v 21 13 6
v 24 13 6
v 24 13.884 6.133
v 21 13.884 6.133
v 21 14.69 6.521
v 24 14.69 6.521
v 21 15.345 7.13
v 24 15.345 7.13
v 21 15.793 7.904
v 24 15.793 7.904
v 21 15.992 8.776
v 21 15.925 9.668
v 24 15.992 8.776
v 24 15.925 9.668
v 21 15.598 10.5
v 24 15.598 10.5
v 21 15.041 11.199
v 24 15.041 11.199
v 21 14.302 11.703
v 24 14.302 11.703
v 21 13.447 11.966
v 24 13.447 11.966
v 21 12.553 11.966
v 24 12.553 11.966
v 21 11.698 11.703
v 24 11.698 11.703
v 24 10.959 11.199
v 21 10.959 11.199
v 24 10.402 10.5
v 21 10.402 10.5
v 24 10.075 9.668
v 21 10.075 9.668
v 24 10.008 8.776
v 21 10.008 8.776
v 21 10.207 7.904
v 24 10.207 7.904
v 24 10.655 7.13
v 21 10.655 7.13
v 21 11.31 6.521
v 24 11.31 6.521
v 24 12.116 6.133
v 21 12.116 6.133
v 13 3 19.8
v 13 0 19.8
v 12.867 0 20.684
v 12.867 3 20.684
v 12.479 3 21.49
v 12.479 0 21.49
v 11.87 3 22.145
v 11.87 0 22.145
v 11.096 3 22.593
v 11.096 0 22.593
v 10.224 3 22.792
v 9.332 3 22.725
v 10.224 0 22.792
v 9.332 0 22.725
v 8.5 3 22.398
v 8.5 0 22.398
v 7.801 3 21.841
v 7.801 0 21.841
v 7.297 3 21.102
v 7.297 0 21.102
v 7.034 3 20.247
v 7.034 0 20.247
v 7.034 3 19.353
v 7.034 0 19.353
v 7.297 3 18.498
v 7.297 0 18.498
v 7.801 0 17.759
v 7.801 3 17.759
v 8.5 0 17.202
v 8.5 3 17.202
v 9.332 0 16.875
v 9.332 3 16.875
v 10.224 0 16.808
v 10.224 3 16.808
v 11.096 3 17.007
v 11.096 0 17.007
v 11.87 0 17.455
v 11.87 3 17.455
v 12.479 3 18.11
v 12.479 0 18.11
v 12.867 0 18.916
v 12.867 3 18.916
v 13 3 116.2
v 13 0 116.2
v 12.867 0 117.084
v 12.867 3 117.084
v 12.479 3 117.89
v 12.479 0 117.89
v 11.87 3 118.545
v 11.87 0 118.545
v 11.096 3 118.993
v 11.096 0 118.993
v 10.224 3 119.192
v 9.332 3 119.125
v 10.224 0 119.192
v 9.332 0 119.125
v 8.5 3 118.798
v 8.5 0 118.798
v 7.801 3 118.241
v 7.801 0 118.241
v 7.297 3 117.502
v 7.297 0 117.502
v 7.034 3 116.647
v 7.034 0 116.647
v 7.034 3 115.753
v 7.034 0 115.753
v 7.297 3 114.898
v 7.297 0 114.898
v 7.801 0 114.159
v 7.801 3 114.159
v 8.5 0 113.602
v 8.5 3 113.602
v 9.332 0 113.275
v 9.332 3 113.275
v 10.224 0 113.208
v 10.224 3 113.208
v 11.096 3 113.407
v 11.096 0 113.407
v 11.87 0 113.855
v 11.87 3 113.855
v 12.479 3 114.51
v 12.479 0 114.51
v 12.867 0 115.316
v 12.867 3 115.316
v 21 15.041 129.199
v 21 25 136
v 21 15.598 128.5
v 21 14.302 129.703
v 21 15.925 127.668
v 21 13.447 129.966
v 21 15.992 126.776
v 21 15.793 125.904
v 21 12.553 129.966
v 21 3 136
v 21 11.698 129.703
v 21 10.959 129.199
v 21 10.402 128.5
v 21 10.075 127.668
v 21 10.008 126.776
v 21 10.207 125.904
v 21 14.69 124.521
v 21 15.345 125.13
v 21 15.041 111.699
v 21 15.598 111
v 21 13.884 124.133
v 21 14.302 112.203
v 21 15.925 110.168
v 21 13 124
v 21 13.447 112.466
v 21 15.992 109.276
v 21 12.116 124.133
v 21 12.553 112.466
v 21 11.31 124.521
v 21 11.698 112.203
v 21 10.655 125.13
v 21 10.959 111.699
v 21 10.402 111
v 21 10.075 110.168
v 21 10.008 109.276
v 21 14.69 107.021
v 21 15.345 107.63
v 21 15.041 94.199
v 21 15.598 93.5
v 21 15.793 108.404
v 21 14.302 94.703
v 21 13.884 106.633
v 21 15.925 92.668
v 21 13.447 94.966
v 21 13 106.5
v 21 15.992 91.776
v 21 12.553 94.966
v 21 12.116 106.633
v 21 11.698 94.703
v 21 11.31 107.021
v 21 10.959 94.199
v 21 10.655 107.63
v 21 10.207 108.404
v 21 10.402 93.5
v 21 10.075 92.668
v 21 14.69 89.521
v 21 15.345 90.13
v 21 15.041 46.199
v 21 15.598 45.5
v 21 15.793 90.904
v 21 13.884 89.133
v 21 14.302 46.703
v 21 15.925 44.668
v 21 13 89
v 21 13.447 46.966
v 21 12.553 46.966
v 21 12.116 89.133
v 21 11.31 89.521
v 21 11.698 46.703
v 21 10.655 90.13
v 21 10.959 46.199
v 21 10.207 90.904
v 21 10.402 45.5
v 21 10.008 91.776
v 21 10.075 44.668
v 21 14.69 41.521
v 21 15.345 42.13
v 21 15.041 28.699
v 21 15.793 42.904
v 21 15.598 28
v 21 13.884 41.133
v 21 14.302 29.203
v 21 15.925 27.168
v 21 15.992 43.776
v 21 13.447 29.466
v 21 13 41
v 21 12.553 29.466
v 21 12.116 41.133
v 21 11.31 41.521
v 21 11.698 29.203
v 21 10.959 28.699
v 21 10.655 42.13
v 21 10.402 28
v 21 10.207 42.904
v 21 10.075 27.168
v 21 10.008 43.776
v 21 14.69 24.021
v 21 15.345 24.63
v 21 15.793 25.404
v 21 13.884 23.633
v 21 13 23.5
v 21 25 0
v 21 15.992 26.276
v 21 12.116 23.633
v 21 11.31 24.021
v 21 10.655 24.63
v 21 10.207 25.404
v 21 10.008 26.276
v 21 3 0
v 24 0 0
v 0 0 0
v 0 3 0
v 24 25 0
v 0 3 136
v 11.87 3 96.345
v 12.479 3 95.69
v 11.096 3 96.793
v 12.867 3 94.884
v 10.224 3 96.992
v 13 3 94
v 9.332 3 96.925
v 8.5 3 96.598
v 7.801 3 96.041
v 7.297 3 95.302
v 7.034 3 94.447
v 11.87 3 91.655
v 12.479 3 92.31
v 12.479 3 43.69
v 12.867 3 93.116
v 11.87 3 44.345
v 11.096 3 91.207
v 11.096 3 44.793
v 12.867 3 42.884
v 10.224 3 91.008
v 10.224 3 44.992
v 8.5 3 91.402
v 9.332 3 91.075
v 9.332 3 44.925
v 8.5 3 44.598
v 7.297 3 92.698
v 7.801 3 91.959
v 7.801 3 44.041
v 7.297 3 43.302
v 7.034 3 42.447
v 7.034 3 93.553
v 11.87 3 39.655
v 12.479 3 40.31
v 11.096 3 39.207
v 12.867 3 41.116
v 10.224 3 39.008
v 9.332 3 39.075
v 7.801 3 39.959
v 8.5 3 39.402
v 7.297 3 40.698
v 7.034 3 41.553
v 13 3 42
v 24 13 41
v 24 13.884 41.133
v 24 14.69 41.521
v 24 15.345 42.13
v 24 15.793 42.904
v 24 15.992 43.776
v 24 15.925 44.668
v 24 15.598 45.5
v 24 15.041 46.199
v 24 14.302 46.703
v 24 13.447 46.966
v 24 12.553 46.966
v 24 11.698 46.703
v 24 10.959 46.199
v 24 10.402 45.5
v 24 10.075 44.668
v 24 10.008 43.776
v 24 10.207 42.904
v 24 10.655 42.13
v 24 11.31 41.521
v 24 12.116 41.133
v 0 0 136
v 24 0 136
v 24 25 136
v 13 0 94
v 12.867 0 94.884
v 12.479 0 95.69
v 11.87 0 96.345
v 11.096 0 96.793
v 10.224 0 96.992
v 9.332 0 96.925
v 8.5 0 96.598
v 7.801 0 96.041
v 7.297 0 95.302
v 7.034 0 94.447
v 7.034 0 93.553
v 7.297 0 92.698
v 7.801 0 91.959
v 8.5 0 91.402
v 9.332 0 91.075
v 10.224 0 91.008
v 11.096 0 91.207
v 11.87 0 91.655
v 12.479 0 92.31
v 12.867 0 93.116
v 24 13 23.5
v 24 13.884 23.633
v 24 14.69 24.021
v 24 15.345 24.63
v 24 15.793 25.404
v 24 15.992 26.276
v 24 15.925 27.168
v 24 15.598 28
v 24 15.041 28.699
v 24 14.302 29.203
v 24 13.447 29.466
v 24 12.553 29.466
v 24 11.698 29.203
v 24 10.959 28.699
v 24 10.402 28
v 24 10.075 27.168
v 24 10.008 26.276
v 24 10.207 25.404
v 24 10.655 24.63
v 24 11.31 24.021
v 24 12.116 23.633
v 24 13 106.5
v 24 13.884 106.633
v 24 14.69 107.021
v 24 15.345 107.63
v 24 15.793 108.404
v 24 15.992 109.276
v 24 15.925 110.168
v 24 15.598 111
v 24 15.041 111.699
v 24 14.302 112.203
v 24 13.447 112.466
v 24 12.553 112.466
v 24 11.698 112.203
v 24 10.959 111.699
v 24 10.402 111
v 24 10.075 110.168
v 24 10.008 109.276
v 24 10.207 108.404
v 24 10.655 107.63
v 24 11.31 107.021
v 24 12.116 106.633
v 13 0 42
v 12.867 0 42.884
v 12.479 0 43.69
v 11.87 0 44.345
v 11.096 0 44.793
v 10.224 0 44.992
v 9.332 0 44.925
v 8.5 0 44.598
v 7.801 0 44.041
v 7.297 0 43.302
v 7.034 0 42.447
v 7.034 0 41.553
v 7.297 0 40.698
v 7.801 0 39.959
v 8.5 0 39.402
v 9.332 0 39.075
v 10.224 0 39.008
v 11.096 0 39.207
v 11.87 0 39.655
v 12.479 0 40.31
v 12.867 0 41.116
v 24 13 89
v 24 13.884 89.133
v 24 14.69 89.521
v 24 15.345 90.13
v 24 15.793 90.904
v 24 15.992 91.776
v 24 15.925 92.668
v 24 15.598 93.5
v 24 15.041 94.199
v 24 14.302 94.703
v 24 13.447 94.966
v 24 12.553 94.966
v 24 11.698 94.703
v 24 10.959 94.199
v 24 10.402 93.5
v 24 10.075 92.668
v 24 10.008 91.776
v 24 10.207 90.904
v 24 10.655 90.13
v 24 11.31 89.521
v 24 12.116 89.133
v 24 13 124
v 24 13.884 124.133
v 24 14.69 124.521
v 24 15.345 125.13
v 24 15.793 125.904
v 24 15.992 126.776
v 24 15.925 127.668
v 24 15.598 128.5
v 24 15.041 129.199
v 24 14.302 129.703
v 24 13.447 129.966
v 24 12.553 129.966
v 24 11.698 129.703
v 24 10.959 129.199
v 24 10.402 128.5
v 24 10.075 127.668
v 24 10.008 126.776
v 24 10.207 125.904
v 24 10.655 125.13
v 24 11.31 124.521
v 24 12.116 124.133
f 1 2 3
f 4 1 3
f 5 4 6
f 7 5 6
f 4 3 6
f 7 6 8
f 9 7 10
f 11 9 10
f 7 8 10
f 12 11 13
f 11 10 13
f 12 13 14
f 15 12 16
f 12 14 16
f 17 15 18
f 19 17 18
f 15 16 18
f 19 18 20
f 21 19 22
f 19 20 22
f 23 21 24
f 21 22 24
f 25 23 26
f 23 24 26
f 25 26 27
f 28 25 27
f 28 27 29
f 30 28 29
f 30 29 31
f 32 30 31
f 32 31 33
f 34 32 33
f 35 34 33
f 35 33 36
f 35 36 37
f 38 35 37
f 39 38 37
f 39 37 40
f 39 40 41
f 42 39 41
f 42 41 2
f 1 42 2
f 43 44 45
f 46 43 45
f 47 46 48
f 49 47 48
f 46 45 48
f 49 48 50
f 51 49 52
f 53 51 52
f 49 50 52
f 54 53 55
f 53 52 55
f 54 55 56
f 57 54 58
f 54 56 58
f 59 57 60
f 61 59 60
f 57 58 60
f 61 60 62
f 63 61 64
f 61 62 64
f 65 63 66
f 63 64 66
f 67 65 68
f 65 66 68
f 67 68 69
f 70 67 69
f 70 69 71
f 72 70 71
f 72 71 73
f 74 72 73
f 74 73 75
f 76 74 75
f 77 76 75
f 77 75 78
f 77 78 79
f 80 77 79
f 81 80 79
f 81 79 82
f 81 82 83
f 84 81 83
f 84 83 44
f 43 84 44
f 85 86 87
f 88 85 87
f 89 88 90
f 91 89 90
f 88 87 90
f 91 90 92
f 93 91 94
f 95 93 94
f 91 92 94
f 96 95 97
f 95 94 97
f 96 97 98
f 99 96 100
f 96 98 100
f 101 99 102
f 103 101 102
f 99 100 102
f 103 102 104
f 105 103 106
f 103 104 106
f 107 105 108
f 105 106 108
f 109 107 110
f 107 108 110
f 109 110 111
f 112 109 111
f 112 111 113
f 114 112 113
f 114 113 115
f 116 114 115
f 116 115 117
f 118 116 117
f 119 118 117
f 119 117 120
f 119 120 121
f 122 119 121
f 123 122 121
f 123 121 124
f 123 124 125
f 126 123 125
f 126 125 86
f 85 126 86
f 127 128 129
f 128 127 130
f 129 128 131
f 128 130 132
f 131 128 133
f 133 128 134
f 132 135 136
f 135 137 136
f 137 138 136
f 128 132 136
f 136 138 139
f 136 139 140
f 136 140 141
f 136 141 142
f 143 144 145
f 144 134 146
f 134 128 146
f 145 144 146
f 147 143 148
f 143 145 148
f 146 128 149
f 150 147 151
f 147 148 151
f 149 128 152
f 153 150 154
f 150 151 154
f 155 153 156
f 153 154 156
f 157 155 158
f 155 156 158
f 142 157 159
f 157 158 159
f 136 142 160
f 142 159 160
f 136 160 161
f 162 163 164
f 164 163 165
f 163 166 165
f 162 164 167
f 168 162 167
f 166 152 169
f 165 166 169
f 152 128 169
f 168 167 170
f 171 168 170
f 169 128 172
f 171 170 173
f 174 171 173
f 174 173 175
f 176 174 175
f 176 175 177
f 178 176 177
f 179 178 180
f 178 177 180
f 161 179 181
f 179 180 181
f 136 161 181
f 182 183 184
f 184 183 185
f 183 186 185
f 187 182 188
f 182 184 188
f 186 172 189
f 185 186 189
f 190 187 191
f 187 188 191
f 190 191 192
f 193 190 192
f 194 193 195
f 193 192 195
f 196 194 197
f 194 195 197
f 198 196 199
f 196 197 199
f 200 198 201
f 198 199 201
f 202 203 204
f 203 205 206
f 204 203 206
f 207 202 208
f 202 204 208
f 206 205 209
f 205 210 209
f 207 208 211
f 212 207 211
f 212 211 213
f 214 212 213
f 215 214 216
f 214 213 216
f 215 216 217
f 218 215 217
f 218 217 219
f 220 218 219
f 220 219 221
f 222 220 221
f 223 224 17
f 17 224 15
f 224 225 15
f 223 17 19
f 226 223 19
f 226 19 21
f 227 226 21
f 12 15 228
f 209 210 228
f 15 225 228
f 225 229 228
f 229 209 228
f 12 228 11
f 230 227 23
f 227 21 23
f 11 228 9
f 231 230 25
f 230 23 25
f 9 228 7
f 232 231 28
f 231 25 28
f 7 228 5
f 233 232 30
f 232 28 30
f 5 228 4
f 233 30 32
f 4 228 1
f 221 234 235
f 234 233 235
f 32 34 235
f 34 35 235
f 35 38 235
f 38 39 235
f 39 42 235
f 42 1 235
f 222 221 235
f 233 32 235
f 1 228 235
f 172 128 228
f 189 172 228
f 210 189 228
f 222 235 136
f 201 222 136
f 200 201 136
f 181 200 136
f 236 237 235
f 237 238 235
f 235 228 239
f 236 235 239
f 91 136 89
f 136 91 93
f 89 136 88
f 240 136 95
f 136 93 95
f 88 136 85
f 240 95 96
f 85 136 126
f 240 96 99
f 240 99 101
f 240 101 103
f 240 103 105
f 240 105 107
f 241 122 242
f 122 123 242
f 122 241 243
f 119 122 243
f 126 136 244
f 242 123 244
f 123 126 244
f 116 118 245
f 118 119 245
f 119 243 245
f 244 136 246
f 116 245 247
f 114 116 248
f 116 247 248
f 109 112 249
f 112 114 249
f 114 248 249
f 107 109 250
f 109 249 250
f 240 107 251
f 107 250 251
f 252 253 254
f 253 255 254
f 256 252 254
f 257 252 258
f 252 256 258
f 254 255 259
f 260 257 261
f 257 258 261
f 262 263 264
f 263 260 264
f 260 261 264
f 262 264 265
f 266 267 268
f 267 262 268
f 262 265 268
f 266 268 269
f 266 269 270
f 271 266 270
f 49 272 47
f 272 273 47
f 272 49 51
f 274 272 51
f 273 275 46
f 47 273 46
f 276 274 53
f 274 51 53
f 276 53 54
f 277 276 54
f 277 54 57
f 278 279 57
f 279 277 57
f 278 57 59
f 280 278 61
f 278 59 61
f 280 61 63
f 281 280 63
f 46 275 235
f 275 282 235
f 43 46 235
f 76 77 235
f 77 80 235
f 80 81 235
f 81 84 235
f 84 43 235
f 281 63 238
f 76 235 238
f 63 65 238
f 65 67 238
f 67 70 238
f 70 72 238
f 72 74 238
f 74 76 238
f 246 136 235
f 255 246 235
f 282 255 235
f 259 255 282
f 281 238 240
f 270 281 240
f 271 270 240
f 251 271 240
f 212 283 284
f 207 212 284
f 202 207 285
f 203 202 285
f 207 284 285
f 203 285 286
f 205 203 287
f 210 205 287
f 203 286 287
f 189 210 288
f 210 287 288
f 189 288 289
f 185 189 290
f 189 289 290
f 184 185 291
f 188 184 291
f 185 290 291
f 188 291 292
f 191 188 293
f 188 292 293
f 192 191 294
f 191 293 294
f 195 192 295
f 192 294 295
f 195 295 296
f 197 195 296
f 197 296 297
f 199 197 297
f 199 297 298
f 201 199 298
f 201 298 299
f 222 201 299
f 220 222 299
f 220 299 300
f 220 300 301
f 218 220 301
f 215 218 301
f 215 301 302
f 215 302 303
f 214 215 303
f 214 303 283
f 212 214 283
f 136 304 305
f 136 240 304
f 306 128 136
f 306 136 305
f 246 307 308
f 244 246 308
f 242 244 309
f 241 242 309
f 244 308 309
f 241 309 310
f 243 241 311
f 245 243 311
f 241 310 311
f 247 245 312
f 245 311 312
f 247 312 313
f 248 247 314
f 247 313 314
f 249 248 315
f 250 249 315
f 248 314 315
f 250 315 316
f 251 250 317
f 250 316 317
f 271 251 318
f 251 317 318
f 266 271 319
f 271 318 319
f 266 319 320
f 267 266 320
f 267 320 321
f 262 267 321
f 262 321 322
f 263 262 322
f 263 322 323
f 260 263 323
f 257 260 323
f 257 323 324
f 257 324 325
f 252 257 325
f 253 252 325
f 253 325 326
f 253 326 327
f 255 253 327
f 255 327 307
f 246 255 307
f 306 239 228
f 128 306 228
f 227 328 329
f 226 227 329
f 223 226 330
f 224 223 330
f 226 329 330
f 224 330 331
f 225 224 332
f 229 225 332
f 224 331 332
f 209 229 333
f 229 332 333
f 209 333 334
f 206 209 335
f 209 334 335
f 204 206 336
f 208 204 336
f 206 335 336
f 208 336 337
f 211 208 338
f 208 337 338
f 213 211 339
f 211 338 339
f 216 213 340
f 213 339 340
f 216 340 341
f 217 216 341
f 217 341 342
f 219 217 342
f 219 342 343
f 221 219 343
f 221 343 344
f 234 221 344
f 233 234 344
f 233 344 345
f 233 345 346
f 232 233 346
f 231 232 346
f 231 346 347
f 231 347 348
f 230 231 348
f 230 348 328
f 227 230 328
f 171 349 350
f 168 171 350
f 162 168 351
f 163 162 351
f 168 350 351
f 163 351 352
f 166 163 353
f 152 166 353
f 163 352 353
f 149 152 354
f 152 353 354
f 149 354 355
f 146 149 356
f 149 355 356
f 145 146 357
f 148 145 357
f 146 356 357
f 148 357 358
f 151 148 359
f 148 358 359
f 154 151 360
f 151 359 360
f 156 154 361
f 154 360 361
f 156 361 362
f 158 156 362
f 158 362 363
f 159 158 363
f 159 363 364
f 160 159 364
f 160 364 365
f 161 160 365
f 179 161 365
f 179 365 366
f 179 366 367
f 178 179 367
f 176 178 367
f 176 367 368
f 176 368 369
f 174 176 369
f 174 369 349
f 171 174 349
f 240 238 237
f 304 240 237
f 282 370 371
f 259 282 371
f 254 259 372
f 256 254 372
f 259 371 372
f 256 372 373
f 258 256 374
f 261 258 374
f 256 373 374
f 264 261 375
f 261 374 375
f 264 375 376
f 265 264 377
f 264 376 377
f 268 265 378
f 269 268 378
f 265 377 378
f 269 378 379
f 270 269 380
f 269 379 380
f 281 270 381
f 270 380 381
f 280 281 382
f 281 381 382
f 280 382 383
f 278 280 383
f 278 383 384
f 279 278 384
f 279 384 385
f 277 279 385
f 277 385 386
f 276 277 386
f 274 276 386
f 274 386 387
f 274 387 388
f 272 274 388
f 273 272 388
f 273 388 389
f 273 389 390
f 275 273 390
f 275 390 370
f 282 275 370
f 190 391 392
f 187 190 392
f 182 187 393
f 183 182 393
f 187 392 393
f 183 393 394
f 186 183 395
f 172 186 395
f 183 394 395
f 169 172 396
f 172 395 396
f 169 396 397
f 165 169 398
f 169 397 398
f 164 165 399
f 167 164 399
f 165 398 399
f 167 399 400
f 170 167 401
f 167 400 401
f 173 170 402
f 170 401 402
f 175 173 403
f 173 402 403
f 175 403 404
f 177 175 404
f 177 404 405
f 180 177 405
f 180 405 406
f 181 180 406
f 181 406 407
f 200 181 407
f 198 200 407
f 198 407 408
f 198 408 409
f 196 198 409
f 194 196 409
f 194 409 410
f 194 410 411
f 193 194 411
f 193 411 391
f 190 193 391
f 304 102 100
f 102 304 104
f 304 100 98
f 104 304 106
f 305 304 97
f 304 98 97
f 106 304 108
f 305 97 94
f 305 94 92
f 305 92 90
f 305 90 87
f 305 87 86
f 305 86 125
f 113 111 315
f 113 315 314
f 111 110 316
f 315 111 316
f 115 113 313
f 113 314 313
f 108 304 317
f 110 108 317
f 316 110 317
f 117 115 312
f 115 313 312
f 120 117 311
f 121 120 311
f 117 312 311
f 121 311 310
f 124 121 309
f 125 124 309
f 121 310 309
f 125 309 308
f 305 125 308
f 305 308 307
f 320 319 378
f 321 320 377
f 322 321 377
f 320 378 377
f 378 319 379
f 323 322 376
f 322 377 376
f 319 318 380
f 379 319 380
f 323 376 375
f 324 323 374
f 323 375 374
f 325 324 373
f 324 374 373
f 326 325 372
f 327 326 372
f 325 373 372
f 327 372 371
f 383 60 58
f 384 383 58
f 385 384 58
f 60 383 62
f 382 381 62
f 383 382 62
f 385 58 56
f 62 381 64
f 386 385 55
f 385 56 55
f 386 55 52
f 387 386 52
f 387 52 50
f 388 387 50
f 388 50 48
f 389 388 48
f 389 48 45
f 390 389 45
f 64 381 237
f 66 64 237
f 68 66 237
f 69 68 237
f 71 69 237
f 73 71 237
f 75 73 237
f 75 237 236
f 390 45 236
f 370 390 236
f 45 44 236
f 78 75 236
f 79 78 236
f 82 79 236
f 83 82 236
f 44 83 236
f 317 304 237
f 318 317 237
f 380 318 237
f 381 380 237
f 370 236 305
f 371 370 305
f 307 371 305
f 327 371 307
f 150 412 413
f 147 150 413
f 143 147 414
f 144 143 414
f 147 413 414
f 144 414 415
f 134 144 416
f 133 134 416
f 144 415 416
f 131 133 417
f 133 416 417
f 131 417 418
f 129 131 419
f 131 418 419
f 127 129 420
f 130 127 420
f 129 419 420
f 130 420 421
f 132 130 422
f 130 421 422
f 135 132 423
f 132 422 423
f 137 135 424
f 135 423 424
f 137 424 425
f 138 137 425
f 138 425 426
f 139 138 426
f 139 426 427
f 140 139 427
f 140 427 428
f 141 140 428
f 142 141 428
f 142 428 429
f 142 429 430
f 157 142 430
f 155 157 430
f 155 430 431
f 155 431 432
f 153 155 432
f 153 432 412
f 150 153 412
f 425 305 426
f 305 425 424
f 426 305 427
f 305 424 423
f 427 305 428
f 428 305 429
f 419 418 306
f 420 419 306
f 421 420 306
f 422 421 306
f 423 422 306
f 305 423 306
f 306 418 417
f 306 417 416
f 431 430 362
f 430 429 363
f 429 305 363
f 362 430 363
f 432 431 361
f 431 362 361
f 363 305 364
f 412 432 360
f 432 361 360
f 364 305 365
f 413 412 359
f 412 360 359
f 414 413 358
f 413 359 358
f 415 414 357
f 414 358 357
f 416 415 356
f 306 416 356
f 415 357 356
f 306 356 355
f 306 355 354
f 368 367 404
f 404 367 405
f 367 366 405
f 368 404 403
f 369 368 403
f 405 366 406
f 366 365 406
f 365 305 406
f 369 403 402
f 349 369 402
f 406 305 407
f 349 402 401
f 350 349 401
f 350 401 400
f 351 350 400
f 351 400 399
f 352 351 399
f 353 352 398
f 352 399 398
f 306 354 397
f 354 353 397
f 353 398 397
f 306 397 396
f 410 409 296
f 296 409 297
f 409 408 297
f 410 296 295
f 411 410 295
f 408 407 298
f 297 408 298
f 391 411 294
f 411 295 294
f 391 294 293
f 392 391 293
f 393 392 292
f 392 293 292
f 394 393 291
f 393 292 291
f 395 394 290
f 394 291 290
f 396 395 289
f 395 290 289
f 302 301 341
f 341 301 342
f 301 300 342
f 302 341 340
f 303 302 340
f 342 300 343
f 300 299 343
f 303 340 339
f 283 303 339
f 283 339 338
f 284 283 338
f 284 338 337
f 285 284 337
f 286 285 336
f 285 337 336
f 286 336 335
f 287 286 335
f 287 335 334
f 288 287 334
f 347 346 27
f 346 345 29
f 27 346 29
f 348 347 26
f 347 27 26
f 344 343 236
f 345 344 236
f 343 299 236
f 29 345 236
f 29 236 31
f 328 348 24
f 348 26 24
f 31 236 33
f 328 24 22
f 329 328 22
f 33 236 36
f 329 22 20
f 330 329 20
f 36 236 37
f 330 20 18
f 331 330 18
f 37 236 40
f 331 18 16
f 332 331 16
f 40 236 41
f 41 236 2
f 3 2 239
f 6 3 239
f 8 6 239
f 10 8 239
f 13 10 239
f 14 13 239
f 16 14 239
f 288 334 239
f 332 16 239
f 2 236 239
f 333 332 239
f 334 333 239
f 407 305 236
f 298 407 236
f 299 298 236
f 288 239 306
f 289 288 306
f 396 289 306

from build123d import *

# Parameters (mm, degrees)
SALIENTE_EXTRUIR1_DEPTH = 136
CROQUIS2_R              = 3
CORTAR_EXTRUIR1_DEPTH   = 25
CROQUIS3_R              = 3
CORTAR_EXTRUIR2_DEPTH   = 26


with BuildPart() as part:
    # Croquis1 → Saliente-Extruir1 (new body)
    with BuildSketch(Plane.XY):
        Polygon((0, 0), (24, 0), (24, 25), (21, 25), (21, 3), (0, 3), align=None)
    extrude(amount=SALIENTE_EXTRUIR1_DEPTH)

    # Croquis2 → Cortar-Extruir1 (cut, through all)
    with BuildSketch(Plane(origin=(24, 0, 0), x_dir=(0, 0, -1), z_dir=(1, 0, 0))):
        with Locations((-127, 13)):
            Circle(CROQUIS2_R)
        with Locations((-109.5, 13)):
            Circle(CROQUIS2_R)
        with Locations((-92, 13)):
            Circle(CROQUIS2_R)
        with Locations((-9, 13)):
            Circle(CROQUIS2_R)
        with Locations((-26.5, 13)):
            Circle(CROQUIS2_R)
        with Locations((-44, 13)):
            Circle(CROQUIS2_R)
    extrude(amount=-CORTAR_EXTRUIR1_DEPTH, mode=Mode.SUBTRACT)

    # Croquis3 → Cortar-Extruir2 (cut, through all)
    with BuildSketch(Plane.XZ):
        with Locations((10, 19.8)):
            Circle(CROQUIS3_R)
        with Locations((10, 42)):
            Circle(CROQUIS3_R)
        with Locations((10, 116.2)):
            Circle(CROQUIS3_R)
        with Locations((10, 94)):
            Circle(CROQUIS3_R)
    extrude(amount=-CORTAR_EXTRUIR2_DEPTH, mode=Mode.SUBTRACT)


solid = part.part
